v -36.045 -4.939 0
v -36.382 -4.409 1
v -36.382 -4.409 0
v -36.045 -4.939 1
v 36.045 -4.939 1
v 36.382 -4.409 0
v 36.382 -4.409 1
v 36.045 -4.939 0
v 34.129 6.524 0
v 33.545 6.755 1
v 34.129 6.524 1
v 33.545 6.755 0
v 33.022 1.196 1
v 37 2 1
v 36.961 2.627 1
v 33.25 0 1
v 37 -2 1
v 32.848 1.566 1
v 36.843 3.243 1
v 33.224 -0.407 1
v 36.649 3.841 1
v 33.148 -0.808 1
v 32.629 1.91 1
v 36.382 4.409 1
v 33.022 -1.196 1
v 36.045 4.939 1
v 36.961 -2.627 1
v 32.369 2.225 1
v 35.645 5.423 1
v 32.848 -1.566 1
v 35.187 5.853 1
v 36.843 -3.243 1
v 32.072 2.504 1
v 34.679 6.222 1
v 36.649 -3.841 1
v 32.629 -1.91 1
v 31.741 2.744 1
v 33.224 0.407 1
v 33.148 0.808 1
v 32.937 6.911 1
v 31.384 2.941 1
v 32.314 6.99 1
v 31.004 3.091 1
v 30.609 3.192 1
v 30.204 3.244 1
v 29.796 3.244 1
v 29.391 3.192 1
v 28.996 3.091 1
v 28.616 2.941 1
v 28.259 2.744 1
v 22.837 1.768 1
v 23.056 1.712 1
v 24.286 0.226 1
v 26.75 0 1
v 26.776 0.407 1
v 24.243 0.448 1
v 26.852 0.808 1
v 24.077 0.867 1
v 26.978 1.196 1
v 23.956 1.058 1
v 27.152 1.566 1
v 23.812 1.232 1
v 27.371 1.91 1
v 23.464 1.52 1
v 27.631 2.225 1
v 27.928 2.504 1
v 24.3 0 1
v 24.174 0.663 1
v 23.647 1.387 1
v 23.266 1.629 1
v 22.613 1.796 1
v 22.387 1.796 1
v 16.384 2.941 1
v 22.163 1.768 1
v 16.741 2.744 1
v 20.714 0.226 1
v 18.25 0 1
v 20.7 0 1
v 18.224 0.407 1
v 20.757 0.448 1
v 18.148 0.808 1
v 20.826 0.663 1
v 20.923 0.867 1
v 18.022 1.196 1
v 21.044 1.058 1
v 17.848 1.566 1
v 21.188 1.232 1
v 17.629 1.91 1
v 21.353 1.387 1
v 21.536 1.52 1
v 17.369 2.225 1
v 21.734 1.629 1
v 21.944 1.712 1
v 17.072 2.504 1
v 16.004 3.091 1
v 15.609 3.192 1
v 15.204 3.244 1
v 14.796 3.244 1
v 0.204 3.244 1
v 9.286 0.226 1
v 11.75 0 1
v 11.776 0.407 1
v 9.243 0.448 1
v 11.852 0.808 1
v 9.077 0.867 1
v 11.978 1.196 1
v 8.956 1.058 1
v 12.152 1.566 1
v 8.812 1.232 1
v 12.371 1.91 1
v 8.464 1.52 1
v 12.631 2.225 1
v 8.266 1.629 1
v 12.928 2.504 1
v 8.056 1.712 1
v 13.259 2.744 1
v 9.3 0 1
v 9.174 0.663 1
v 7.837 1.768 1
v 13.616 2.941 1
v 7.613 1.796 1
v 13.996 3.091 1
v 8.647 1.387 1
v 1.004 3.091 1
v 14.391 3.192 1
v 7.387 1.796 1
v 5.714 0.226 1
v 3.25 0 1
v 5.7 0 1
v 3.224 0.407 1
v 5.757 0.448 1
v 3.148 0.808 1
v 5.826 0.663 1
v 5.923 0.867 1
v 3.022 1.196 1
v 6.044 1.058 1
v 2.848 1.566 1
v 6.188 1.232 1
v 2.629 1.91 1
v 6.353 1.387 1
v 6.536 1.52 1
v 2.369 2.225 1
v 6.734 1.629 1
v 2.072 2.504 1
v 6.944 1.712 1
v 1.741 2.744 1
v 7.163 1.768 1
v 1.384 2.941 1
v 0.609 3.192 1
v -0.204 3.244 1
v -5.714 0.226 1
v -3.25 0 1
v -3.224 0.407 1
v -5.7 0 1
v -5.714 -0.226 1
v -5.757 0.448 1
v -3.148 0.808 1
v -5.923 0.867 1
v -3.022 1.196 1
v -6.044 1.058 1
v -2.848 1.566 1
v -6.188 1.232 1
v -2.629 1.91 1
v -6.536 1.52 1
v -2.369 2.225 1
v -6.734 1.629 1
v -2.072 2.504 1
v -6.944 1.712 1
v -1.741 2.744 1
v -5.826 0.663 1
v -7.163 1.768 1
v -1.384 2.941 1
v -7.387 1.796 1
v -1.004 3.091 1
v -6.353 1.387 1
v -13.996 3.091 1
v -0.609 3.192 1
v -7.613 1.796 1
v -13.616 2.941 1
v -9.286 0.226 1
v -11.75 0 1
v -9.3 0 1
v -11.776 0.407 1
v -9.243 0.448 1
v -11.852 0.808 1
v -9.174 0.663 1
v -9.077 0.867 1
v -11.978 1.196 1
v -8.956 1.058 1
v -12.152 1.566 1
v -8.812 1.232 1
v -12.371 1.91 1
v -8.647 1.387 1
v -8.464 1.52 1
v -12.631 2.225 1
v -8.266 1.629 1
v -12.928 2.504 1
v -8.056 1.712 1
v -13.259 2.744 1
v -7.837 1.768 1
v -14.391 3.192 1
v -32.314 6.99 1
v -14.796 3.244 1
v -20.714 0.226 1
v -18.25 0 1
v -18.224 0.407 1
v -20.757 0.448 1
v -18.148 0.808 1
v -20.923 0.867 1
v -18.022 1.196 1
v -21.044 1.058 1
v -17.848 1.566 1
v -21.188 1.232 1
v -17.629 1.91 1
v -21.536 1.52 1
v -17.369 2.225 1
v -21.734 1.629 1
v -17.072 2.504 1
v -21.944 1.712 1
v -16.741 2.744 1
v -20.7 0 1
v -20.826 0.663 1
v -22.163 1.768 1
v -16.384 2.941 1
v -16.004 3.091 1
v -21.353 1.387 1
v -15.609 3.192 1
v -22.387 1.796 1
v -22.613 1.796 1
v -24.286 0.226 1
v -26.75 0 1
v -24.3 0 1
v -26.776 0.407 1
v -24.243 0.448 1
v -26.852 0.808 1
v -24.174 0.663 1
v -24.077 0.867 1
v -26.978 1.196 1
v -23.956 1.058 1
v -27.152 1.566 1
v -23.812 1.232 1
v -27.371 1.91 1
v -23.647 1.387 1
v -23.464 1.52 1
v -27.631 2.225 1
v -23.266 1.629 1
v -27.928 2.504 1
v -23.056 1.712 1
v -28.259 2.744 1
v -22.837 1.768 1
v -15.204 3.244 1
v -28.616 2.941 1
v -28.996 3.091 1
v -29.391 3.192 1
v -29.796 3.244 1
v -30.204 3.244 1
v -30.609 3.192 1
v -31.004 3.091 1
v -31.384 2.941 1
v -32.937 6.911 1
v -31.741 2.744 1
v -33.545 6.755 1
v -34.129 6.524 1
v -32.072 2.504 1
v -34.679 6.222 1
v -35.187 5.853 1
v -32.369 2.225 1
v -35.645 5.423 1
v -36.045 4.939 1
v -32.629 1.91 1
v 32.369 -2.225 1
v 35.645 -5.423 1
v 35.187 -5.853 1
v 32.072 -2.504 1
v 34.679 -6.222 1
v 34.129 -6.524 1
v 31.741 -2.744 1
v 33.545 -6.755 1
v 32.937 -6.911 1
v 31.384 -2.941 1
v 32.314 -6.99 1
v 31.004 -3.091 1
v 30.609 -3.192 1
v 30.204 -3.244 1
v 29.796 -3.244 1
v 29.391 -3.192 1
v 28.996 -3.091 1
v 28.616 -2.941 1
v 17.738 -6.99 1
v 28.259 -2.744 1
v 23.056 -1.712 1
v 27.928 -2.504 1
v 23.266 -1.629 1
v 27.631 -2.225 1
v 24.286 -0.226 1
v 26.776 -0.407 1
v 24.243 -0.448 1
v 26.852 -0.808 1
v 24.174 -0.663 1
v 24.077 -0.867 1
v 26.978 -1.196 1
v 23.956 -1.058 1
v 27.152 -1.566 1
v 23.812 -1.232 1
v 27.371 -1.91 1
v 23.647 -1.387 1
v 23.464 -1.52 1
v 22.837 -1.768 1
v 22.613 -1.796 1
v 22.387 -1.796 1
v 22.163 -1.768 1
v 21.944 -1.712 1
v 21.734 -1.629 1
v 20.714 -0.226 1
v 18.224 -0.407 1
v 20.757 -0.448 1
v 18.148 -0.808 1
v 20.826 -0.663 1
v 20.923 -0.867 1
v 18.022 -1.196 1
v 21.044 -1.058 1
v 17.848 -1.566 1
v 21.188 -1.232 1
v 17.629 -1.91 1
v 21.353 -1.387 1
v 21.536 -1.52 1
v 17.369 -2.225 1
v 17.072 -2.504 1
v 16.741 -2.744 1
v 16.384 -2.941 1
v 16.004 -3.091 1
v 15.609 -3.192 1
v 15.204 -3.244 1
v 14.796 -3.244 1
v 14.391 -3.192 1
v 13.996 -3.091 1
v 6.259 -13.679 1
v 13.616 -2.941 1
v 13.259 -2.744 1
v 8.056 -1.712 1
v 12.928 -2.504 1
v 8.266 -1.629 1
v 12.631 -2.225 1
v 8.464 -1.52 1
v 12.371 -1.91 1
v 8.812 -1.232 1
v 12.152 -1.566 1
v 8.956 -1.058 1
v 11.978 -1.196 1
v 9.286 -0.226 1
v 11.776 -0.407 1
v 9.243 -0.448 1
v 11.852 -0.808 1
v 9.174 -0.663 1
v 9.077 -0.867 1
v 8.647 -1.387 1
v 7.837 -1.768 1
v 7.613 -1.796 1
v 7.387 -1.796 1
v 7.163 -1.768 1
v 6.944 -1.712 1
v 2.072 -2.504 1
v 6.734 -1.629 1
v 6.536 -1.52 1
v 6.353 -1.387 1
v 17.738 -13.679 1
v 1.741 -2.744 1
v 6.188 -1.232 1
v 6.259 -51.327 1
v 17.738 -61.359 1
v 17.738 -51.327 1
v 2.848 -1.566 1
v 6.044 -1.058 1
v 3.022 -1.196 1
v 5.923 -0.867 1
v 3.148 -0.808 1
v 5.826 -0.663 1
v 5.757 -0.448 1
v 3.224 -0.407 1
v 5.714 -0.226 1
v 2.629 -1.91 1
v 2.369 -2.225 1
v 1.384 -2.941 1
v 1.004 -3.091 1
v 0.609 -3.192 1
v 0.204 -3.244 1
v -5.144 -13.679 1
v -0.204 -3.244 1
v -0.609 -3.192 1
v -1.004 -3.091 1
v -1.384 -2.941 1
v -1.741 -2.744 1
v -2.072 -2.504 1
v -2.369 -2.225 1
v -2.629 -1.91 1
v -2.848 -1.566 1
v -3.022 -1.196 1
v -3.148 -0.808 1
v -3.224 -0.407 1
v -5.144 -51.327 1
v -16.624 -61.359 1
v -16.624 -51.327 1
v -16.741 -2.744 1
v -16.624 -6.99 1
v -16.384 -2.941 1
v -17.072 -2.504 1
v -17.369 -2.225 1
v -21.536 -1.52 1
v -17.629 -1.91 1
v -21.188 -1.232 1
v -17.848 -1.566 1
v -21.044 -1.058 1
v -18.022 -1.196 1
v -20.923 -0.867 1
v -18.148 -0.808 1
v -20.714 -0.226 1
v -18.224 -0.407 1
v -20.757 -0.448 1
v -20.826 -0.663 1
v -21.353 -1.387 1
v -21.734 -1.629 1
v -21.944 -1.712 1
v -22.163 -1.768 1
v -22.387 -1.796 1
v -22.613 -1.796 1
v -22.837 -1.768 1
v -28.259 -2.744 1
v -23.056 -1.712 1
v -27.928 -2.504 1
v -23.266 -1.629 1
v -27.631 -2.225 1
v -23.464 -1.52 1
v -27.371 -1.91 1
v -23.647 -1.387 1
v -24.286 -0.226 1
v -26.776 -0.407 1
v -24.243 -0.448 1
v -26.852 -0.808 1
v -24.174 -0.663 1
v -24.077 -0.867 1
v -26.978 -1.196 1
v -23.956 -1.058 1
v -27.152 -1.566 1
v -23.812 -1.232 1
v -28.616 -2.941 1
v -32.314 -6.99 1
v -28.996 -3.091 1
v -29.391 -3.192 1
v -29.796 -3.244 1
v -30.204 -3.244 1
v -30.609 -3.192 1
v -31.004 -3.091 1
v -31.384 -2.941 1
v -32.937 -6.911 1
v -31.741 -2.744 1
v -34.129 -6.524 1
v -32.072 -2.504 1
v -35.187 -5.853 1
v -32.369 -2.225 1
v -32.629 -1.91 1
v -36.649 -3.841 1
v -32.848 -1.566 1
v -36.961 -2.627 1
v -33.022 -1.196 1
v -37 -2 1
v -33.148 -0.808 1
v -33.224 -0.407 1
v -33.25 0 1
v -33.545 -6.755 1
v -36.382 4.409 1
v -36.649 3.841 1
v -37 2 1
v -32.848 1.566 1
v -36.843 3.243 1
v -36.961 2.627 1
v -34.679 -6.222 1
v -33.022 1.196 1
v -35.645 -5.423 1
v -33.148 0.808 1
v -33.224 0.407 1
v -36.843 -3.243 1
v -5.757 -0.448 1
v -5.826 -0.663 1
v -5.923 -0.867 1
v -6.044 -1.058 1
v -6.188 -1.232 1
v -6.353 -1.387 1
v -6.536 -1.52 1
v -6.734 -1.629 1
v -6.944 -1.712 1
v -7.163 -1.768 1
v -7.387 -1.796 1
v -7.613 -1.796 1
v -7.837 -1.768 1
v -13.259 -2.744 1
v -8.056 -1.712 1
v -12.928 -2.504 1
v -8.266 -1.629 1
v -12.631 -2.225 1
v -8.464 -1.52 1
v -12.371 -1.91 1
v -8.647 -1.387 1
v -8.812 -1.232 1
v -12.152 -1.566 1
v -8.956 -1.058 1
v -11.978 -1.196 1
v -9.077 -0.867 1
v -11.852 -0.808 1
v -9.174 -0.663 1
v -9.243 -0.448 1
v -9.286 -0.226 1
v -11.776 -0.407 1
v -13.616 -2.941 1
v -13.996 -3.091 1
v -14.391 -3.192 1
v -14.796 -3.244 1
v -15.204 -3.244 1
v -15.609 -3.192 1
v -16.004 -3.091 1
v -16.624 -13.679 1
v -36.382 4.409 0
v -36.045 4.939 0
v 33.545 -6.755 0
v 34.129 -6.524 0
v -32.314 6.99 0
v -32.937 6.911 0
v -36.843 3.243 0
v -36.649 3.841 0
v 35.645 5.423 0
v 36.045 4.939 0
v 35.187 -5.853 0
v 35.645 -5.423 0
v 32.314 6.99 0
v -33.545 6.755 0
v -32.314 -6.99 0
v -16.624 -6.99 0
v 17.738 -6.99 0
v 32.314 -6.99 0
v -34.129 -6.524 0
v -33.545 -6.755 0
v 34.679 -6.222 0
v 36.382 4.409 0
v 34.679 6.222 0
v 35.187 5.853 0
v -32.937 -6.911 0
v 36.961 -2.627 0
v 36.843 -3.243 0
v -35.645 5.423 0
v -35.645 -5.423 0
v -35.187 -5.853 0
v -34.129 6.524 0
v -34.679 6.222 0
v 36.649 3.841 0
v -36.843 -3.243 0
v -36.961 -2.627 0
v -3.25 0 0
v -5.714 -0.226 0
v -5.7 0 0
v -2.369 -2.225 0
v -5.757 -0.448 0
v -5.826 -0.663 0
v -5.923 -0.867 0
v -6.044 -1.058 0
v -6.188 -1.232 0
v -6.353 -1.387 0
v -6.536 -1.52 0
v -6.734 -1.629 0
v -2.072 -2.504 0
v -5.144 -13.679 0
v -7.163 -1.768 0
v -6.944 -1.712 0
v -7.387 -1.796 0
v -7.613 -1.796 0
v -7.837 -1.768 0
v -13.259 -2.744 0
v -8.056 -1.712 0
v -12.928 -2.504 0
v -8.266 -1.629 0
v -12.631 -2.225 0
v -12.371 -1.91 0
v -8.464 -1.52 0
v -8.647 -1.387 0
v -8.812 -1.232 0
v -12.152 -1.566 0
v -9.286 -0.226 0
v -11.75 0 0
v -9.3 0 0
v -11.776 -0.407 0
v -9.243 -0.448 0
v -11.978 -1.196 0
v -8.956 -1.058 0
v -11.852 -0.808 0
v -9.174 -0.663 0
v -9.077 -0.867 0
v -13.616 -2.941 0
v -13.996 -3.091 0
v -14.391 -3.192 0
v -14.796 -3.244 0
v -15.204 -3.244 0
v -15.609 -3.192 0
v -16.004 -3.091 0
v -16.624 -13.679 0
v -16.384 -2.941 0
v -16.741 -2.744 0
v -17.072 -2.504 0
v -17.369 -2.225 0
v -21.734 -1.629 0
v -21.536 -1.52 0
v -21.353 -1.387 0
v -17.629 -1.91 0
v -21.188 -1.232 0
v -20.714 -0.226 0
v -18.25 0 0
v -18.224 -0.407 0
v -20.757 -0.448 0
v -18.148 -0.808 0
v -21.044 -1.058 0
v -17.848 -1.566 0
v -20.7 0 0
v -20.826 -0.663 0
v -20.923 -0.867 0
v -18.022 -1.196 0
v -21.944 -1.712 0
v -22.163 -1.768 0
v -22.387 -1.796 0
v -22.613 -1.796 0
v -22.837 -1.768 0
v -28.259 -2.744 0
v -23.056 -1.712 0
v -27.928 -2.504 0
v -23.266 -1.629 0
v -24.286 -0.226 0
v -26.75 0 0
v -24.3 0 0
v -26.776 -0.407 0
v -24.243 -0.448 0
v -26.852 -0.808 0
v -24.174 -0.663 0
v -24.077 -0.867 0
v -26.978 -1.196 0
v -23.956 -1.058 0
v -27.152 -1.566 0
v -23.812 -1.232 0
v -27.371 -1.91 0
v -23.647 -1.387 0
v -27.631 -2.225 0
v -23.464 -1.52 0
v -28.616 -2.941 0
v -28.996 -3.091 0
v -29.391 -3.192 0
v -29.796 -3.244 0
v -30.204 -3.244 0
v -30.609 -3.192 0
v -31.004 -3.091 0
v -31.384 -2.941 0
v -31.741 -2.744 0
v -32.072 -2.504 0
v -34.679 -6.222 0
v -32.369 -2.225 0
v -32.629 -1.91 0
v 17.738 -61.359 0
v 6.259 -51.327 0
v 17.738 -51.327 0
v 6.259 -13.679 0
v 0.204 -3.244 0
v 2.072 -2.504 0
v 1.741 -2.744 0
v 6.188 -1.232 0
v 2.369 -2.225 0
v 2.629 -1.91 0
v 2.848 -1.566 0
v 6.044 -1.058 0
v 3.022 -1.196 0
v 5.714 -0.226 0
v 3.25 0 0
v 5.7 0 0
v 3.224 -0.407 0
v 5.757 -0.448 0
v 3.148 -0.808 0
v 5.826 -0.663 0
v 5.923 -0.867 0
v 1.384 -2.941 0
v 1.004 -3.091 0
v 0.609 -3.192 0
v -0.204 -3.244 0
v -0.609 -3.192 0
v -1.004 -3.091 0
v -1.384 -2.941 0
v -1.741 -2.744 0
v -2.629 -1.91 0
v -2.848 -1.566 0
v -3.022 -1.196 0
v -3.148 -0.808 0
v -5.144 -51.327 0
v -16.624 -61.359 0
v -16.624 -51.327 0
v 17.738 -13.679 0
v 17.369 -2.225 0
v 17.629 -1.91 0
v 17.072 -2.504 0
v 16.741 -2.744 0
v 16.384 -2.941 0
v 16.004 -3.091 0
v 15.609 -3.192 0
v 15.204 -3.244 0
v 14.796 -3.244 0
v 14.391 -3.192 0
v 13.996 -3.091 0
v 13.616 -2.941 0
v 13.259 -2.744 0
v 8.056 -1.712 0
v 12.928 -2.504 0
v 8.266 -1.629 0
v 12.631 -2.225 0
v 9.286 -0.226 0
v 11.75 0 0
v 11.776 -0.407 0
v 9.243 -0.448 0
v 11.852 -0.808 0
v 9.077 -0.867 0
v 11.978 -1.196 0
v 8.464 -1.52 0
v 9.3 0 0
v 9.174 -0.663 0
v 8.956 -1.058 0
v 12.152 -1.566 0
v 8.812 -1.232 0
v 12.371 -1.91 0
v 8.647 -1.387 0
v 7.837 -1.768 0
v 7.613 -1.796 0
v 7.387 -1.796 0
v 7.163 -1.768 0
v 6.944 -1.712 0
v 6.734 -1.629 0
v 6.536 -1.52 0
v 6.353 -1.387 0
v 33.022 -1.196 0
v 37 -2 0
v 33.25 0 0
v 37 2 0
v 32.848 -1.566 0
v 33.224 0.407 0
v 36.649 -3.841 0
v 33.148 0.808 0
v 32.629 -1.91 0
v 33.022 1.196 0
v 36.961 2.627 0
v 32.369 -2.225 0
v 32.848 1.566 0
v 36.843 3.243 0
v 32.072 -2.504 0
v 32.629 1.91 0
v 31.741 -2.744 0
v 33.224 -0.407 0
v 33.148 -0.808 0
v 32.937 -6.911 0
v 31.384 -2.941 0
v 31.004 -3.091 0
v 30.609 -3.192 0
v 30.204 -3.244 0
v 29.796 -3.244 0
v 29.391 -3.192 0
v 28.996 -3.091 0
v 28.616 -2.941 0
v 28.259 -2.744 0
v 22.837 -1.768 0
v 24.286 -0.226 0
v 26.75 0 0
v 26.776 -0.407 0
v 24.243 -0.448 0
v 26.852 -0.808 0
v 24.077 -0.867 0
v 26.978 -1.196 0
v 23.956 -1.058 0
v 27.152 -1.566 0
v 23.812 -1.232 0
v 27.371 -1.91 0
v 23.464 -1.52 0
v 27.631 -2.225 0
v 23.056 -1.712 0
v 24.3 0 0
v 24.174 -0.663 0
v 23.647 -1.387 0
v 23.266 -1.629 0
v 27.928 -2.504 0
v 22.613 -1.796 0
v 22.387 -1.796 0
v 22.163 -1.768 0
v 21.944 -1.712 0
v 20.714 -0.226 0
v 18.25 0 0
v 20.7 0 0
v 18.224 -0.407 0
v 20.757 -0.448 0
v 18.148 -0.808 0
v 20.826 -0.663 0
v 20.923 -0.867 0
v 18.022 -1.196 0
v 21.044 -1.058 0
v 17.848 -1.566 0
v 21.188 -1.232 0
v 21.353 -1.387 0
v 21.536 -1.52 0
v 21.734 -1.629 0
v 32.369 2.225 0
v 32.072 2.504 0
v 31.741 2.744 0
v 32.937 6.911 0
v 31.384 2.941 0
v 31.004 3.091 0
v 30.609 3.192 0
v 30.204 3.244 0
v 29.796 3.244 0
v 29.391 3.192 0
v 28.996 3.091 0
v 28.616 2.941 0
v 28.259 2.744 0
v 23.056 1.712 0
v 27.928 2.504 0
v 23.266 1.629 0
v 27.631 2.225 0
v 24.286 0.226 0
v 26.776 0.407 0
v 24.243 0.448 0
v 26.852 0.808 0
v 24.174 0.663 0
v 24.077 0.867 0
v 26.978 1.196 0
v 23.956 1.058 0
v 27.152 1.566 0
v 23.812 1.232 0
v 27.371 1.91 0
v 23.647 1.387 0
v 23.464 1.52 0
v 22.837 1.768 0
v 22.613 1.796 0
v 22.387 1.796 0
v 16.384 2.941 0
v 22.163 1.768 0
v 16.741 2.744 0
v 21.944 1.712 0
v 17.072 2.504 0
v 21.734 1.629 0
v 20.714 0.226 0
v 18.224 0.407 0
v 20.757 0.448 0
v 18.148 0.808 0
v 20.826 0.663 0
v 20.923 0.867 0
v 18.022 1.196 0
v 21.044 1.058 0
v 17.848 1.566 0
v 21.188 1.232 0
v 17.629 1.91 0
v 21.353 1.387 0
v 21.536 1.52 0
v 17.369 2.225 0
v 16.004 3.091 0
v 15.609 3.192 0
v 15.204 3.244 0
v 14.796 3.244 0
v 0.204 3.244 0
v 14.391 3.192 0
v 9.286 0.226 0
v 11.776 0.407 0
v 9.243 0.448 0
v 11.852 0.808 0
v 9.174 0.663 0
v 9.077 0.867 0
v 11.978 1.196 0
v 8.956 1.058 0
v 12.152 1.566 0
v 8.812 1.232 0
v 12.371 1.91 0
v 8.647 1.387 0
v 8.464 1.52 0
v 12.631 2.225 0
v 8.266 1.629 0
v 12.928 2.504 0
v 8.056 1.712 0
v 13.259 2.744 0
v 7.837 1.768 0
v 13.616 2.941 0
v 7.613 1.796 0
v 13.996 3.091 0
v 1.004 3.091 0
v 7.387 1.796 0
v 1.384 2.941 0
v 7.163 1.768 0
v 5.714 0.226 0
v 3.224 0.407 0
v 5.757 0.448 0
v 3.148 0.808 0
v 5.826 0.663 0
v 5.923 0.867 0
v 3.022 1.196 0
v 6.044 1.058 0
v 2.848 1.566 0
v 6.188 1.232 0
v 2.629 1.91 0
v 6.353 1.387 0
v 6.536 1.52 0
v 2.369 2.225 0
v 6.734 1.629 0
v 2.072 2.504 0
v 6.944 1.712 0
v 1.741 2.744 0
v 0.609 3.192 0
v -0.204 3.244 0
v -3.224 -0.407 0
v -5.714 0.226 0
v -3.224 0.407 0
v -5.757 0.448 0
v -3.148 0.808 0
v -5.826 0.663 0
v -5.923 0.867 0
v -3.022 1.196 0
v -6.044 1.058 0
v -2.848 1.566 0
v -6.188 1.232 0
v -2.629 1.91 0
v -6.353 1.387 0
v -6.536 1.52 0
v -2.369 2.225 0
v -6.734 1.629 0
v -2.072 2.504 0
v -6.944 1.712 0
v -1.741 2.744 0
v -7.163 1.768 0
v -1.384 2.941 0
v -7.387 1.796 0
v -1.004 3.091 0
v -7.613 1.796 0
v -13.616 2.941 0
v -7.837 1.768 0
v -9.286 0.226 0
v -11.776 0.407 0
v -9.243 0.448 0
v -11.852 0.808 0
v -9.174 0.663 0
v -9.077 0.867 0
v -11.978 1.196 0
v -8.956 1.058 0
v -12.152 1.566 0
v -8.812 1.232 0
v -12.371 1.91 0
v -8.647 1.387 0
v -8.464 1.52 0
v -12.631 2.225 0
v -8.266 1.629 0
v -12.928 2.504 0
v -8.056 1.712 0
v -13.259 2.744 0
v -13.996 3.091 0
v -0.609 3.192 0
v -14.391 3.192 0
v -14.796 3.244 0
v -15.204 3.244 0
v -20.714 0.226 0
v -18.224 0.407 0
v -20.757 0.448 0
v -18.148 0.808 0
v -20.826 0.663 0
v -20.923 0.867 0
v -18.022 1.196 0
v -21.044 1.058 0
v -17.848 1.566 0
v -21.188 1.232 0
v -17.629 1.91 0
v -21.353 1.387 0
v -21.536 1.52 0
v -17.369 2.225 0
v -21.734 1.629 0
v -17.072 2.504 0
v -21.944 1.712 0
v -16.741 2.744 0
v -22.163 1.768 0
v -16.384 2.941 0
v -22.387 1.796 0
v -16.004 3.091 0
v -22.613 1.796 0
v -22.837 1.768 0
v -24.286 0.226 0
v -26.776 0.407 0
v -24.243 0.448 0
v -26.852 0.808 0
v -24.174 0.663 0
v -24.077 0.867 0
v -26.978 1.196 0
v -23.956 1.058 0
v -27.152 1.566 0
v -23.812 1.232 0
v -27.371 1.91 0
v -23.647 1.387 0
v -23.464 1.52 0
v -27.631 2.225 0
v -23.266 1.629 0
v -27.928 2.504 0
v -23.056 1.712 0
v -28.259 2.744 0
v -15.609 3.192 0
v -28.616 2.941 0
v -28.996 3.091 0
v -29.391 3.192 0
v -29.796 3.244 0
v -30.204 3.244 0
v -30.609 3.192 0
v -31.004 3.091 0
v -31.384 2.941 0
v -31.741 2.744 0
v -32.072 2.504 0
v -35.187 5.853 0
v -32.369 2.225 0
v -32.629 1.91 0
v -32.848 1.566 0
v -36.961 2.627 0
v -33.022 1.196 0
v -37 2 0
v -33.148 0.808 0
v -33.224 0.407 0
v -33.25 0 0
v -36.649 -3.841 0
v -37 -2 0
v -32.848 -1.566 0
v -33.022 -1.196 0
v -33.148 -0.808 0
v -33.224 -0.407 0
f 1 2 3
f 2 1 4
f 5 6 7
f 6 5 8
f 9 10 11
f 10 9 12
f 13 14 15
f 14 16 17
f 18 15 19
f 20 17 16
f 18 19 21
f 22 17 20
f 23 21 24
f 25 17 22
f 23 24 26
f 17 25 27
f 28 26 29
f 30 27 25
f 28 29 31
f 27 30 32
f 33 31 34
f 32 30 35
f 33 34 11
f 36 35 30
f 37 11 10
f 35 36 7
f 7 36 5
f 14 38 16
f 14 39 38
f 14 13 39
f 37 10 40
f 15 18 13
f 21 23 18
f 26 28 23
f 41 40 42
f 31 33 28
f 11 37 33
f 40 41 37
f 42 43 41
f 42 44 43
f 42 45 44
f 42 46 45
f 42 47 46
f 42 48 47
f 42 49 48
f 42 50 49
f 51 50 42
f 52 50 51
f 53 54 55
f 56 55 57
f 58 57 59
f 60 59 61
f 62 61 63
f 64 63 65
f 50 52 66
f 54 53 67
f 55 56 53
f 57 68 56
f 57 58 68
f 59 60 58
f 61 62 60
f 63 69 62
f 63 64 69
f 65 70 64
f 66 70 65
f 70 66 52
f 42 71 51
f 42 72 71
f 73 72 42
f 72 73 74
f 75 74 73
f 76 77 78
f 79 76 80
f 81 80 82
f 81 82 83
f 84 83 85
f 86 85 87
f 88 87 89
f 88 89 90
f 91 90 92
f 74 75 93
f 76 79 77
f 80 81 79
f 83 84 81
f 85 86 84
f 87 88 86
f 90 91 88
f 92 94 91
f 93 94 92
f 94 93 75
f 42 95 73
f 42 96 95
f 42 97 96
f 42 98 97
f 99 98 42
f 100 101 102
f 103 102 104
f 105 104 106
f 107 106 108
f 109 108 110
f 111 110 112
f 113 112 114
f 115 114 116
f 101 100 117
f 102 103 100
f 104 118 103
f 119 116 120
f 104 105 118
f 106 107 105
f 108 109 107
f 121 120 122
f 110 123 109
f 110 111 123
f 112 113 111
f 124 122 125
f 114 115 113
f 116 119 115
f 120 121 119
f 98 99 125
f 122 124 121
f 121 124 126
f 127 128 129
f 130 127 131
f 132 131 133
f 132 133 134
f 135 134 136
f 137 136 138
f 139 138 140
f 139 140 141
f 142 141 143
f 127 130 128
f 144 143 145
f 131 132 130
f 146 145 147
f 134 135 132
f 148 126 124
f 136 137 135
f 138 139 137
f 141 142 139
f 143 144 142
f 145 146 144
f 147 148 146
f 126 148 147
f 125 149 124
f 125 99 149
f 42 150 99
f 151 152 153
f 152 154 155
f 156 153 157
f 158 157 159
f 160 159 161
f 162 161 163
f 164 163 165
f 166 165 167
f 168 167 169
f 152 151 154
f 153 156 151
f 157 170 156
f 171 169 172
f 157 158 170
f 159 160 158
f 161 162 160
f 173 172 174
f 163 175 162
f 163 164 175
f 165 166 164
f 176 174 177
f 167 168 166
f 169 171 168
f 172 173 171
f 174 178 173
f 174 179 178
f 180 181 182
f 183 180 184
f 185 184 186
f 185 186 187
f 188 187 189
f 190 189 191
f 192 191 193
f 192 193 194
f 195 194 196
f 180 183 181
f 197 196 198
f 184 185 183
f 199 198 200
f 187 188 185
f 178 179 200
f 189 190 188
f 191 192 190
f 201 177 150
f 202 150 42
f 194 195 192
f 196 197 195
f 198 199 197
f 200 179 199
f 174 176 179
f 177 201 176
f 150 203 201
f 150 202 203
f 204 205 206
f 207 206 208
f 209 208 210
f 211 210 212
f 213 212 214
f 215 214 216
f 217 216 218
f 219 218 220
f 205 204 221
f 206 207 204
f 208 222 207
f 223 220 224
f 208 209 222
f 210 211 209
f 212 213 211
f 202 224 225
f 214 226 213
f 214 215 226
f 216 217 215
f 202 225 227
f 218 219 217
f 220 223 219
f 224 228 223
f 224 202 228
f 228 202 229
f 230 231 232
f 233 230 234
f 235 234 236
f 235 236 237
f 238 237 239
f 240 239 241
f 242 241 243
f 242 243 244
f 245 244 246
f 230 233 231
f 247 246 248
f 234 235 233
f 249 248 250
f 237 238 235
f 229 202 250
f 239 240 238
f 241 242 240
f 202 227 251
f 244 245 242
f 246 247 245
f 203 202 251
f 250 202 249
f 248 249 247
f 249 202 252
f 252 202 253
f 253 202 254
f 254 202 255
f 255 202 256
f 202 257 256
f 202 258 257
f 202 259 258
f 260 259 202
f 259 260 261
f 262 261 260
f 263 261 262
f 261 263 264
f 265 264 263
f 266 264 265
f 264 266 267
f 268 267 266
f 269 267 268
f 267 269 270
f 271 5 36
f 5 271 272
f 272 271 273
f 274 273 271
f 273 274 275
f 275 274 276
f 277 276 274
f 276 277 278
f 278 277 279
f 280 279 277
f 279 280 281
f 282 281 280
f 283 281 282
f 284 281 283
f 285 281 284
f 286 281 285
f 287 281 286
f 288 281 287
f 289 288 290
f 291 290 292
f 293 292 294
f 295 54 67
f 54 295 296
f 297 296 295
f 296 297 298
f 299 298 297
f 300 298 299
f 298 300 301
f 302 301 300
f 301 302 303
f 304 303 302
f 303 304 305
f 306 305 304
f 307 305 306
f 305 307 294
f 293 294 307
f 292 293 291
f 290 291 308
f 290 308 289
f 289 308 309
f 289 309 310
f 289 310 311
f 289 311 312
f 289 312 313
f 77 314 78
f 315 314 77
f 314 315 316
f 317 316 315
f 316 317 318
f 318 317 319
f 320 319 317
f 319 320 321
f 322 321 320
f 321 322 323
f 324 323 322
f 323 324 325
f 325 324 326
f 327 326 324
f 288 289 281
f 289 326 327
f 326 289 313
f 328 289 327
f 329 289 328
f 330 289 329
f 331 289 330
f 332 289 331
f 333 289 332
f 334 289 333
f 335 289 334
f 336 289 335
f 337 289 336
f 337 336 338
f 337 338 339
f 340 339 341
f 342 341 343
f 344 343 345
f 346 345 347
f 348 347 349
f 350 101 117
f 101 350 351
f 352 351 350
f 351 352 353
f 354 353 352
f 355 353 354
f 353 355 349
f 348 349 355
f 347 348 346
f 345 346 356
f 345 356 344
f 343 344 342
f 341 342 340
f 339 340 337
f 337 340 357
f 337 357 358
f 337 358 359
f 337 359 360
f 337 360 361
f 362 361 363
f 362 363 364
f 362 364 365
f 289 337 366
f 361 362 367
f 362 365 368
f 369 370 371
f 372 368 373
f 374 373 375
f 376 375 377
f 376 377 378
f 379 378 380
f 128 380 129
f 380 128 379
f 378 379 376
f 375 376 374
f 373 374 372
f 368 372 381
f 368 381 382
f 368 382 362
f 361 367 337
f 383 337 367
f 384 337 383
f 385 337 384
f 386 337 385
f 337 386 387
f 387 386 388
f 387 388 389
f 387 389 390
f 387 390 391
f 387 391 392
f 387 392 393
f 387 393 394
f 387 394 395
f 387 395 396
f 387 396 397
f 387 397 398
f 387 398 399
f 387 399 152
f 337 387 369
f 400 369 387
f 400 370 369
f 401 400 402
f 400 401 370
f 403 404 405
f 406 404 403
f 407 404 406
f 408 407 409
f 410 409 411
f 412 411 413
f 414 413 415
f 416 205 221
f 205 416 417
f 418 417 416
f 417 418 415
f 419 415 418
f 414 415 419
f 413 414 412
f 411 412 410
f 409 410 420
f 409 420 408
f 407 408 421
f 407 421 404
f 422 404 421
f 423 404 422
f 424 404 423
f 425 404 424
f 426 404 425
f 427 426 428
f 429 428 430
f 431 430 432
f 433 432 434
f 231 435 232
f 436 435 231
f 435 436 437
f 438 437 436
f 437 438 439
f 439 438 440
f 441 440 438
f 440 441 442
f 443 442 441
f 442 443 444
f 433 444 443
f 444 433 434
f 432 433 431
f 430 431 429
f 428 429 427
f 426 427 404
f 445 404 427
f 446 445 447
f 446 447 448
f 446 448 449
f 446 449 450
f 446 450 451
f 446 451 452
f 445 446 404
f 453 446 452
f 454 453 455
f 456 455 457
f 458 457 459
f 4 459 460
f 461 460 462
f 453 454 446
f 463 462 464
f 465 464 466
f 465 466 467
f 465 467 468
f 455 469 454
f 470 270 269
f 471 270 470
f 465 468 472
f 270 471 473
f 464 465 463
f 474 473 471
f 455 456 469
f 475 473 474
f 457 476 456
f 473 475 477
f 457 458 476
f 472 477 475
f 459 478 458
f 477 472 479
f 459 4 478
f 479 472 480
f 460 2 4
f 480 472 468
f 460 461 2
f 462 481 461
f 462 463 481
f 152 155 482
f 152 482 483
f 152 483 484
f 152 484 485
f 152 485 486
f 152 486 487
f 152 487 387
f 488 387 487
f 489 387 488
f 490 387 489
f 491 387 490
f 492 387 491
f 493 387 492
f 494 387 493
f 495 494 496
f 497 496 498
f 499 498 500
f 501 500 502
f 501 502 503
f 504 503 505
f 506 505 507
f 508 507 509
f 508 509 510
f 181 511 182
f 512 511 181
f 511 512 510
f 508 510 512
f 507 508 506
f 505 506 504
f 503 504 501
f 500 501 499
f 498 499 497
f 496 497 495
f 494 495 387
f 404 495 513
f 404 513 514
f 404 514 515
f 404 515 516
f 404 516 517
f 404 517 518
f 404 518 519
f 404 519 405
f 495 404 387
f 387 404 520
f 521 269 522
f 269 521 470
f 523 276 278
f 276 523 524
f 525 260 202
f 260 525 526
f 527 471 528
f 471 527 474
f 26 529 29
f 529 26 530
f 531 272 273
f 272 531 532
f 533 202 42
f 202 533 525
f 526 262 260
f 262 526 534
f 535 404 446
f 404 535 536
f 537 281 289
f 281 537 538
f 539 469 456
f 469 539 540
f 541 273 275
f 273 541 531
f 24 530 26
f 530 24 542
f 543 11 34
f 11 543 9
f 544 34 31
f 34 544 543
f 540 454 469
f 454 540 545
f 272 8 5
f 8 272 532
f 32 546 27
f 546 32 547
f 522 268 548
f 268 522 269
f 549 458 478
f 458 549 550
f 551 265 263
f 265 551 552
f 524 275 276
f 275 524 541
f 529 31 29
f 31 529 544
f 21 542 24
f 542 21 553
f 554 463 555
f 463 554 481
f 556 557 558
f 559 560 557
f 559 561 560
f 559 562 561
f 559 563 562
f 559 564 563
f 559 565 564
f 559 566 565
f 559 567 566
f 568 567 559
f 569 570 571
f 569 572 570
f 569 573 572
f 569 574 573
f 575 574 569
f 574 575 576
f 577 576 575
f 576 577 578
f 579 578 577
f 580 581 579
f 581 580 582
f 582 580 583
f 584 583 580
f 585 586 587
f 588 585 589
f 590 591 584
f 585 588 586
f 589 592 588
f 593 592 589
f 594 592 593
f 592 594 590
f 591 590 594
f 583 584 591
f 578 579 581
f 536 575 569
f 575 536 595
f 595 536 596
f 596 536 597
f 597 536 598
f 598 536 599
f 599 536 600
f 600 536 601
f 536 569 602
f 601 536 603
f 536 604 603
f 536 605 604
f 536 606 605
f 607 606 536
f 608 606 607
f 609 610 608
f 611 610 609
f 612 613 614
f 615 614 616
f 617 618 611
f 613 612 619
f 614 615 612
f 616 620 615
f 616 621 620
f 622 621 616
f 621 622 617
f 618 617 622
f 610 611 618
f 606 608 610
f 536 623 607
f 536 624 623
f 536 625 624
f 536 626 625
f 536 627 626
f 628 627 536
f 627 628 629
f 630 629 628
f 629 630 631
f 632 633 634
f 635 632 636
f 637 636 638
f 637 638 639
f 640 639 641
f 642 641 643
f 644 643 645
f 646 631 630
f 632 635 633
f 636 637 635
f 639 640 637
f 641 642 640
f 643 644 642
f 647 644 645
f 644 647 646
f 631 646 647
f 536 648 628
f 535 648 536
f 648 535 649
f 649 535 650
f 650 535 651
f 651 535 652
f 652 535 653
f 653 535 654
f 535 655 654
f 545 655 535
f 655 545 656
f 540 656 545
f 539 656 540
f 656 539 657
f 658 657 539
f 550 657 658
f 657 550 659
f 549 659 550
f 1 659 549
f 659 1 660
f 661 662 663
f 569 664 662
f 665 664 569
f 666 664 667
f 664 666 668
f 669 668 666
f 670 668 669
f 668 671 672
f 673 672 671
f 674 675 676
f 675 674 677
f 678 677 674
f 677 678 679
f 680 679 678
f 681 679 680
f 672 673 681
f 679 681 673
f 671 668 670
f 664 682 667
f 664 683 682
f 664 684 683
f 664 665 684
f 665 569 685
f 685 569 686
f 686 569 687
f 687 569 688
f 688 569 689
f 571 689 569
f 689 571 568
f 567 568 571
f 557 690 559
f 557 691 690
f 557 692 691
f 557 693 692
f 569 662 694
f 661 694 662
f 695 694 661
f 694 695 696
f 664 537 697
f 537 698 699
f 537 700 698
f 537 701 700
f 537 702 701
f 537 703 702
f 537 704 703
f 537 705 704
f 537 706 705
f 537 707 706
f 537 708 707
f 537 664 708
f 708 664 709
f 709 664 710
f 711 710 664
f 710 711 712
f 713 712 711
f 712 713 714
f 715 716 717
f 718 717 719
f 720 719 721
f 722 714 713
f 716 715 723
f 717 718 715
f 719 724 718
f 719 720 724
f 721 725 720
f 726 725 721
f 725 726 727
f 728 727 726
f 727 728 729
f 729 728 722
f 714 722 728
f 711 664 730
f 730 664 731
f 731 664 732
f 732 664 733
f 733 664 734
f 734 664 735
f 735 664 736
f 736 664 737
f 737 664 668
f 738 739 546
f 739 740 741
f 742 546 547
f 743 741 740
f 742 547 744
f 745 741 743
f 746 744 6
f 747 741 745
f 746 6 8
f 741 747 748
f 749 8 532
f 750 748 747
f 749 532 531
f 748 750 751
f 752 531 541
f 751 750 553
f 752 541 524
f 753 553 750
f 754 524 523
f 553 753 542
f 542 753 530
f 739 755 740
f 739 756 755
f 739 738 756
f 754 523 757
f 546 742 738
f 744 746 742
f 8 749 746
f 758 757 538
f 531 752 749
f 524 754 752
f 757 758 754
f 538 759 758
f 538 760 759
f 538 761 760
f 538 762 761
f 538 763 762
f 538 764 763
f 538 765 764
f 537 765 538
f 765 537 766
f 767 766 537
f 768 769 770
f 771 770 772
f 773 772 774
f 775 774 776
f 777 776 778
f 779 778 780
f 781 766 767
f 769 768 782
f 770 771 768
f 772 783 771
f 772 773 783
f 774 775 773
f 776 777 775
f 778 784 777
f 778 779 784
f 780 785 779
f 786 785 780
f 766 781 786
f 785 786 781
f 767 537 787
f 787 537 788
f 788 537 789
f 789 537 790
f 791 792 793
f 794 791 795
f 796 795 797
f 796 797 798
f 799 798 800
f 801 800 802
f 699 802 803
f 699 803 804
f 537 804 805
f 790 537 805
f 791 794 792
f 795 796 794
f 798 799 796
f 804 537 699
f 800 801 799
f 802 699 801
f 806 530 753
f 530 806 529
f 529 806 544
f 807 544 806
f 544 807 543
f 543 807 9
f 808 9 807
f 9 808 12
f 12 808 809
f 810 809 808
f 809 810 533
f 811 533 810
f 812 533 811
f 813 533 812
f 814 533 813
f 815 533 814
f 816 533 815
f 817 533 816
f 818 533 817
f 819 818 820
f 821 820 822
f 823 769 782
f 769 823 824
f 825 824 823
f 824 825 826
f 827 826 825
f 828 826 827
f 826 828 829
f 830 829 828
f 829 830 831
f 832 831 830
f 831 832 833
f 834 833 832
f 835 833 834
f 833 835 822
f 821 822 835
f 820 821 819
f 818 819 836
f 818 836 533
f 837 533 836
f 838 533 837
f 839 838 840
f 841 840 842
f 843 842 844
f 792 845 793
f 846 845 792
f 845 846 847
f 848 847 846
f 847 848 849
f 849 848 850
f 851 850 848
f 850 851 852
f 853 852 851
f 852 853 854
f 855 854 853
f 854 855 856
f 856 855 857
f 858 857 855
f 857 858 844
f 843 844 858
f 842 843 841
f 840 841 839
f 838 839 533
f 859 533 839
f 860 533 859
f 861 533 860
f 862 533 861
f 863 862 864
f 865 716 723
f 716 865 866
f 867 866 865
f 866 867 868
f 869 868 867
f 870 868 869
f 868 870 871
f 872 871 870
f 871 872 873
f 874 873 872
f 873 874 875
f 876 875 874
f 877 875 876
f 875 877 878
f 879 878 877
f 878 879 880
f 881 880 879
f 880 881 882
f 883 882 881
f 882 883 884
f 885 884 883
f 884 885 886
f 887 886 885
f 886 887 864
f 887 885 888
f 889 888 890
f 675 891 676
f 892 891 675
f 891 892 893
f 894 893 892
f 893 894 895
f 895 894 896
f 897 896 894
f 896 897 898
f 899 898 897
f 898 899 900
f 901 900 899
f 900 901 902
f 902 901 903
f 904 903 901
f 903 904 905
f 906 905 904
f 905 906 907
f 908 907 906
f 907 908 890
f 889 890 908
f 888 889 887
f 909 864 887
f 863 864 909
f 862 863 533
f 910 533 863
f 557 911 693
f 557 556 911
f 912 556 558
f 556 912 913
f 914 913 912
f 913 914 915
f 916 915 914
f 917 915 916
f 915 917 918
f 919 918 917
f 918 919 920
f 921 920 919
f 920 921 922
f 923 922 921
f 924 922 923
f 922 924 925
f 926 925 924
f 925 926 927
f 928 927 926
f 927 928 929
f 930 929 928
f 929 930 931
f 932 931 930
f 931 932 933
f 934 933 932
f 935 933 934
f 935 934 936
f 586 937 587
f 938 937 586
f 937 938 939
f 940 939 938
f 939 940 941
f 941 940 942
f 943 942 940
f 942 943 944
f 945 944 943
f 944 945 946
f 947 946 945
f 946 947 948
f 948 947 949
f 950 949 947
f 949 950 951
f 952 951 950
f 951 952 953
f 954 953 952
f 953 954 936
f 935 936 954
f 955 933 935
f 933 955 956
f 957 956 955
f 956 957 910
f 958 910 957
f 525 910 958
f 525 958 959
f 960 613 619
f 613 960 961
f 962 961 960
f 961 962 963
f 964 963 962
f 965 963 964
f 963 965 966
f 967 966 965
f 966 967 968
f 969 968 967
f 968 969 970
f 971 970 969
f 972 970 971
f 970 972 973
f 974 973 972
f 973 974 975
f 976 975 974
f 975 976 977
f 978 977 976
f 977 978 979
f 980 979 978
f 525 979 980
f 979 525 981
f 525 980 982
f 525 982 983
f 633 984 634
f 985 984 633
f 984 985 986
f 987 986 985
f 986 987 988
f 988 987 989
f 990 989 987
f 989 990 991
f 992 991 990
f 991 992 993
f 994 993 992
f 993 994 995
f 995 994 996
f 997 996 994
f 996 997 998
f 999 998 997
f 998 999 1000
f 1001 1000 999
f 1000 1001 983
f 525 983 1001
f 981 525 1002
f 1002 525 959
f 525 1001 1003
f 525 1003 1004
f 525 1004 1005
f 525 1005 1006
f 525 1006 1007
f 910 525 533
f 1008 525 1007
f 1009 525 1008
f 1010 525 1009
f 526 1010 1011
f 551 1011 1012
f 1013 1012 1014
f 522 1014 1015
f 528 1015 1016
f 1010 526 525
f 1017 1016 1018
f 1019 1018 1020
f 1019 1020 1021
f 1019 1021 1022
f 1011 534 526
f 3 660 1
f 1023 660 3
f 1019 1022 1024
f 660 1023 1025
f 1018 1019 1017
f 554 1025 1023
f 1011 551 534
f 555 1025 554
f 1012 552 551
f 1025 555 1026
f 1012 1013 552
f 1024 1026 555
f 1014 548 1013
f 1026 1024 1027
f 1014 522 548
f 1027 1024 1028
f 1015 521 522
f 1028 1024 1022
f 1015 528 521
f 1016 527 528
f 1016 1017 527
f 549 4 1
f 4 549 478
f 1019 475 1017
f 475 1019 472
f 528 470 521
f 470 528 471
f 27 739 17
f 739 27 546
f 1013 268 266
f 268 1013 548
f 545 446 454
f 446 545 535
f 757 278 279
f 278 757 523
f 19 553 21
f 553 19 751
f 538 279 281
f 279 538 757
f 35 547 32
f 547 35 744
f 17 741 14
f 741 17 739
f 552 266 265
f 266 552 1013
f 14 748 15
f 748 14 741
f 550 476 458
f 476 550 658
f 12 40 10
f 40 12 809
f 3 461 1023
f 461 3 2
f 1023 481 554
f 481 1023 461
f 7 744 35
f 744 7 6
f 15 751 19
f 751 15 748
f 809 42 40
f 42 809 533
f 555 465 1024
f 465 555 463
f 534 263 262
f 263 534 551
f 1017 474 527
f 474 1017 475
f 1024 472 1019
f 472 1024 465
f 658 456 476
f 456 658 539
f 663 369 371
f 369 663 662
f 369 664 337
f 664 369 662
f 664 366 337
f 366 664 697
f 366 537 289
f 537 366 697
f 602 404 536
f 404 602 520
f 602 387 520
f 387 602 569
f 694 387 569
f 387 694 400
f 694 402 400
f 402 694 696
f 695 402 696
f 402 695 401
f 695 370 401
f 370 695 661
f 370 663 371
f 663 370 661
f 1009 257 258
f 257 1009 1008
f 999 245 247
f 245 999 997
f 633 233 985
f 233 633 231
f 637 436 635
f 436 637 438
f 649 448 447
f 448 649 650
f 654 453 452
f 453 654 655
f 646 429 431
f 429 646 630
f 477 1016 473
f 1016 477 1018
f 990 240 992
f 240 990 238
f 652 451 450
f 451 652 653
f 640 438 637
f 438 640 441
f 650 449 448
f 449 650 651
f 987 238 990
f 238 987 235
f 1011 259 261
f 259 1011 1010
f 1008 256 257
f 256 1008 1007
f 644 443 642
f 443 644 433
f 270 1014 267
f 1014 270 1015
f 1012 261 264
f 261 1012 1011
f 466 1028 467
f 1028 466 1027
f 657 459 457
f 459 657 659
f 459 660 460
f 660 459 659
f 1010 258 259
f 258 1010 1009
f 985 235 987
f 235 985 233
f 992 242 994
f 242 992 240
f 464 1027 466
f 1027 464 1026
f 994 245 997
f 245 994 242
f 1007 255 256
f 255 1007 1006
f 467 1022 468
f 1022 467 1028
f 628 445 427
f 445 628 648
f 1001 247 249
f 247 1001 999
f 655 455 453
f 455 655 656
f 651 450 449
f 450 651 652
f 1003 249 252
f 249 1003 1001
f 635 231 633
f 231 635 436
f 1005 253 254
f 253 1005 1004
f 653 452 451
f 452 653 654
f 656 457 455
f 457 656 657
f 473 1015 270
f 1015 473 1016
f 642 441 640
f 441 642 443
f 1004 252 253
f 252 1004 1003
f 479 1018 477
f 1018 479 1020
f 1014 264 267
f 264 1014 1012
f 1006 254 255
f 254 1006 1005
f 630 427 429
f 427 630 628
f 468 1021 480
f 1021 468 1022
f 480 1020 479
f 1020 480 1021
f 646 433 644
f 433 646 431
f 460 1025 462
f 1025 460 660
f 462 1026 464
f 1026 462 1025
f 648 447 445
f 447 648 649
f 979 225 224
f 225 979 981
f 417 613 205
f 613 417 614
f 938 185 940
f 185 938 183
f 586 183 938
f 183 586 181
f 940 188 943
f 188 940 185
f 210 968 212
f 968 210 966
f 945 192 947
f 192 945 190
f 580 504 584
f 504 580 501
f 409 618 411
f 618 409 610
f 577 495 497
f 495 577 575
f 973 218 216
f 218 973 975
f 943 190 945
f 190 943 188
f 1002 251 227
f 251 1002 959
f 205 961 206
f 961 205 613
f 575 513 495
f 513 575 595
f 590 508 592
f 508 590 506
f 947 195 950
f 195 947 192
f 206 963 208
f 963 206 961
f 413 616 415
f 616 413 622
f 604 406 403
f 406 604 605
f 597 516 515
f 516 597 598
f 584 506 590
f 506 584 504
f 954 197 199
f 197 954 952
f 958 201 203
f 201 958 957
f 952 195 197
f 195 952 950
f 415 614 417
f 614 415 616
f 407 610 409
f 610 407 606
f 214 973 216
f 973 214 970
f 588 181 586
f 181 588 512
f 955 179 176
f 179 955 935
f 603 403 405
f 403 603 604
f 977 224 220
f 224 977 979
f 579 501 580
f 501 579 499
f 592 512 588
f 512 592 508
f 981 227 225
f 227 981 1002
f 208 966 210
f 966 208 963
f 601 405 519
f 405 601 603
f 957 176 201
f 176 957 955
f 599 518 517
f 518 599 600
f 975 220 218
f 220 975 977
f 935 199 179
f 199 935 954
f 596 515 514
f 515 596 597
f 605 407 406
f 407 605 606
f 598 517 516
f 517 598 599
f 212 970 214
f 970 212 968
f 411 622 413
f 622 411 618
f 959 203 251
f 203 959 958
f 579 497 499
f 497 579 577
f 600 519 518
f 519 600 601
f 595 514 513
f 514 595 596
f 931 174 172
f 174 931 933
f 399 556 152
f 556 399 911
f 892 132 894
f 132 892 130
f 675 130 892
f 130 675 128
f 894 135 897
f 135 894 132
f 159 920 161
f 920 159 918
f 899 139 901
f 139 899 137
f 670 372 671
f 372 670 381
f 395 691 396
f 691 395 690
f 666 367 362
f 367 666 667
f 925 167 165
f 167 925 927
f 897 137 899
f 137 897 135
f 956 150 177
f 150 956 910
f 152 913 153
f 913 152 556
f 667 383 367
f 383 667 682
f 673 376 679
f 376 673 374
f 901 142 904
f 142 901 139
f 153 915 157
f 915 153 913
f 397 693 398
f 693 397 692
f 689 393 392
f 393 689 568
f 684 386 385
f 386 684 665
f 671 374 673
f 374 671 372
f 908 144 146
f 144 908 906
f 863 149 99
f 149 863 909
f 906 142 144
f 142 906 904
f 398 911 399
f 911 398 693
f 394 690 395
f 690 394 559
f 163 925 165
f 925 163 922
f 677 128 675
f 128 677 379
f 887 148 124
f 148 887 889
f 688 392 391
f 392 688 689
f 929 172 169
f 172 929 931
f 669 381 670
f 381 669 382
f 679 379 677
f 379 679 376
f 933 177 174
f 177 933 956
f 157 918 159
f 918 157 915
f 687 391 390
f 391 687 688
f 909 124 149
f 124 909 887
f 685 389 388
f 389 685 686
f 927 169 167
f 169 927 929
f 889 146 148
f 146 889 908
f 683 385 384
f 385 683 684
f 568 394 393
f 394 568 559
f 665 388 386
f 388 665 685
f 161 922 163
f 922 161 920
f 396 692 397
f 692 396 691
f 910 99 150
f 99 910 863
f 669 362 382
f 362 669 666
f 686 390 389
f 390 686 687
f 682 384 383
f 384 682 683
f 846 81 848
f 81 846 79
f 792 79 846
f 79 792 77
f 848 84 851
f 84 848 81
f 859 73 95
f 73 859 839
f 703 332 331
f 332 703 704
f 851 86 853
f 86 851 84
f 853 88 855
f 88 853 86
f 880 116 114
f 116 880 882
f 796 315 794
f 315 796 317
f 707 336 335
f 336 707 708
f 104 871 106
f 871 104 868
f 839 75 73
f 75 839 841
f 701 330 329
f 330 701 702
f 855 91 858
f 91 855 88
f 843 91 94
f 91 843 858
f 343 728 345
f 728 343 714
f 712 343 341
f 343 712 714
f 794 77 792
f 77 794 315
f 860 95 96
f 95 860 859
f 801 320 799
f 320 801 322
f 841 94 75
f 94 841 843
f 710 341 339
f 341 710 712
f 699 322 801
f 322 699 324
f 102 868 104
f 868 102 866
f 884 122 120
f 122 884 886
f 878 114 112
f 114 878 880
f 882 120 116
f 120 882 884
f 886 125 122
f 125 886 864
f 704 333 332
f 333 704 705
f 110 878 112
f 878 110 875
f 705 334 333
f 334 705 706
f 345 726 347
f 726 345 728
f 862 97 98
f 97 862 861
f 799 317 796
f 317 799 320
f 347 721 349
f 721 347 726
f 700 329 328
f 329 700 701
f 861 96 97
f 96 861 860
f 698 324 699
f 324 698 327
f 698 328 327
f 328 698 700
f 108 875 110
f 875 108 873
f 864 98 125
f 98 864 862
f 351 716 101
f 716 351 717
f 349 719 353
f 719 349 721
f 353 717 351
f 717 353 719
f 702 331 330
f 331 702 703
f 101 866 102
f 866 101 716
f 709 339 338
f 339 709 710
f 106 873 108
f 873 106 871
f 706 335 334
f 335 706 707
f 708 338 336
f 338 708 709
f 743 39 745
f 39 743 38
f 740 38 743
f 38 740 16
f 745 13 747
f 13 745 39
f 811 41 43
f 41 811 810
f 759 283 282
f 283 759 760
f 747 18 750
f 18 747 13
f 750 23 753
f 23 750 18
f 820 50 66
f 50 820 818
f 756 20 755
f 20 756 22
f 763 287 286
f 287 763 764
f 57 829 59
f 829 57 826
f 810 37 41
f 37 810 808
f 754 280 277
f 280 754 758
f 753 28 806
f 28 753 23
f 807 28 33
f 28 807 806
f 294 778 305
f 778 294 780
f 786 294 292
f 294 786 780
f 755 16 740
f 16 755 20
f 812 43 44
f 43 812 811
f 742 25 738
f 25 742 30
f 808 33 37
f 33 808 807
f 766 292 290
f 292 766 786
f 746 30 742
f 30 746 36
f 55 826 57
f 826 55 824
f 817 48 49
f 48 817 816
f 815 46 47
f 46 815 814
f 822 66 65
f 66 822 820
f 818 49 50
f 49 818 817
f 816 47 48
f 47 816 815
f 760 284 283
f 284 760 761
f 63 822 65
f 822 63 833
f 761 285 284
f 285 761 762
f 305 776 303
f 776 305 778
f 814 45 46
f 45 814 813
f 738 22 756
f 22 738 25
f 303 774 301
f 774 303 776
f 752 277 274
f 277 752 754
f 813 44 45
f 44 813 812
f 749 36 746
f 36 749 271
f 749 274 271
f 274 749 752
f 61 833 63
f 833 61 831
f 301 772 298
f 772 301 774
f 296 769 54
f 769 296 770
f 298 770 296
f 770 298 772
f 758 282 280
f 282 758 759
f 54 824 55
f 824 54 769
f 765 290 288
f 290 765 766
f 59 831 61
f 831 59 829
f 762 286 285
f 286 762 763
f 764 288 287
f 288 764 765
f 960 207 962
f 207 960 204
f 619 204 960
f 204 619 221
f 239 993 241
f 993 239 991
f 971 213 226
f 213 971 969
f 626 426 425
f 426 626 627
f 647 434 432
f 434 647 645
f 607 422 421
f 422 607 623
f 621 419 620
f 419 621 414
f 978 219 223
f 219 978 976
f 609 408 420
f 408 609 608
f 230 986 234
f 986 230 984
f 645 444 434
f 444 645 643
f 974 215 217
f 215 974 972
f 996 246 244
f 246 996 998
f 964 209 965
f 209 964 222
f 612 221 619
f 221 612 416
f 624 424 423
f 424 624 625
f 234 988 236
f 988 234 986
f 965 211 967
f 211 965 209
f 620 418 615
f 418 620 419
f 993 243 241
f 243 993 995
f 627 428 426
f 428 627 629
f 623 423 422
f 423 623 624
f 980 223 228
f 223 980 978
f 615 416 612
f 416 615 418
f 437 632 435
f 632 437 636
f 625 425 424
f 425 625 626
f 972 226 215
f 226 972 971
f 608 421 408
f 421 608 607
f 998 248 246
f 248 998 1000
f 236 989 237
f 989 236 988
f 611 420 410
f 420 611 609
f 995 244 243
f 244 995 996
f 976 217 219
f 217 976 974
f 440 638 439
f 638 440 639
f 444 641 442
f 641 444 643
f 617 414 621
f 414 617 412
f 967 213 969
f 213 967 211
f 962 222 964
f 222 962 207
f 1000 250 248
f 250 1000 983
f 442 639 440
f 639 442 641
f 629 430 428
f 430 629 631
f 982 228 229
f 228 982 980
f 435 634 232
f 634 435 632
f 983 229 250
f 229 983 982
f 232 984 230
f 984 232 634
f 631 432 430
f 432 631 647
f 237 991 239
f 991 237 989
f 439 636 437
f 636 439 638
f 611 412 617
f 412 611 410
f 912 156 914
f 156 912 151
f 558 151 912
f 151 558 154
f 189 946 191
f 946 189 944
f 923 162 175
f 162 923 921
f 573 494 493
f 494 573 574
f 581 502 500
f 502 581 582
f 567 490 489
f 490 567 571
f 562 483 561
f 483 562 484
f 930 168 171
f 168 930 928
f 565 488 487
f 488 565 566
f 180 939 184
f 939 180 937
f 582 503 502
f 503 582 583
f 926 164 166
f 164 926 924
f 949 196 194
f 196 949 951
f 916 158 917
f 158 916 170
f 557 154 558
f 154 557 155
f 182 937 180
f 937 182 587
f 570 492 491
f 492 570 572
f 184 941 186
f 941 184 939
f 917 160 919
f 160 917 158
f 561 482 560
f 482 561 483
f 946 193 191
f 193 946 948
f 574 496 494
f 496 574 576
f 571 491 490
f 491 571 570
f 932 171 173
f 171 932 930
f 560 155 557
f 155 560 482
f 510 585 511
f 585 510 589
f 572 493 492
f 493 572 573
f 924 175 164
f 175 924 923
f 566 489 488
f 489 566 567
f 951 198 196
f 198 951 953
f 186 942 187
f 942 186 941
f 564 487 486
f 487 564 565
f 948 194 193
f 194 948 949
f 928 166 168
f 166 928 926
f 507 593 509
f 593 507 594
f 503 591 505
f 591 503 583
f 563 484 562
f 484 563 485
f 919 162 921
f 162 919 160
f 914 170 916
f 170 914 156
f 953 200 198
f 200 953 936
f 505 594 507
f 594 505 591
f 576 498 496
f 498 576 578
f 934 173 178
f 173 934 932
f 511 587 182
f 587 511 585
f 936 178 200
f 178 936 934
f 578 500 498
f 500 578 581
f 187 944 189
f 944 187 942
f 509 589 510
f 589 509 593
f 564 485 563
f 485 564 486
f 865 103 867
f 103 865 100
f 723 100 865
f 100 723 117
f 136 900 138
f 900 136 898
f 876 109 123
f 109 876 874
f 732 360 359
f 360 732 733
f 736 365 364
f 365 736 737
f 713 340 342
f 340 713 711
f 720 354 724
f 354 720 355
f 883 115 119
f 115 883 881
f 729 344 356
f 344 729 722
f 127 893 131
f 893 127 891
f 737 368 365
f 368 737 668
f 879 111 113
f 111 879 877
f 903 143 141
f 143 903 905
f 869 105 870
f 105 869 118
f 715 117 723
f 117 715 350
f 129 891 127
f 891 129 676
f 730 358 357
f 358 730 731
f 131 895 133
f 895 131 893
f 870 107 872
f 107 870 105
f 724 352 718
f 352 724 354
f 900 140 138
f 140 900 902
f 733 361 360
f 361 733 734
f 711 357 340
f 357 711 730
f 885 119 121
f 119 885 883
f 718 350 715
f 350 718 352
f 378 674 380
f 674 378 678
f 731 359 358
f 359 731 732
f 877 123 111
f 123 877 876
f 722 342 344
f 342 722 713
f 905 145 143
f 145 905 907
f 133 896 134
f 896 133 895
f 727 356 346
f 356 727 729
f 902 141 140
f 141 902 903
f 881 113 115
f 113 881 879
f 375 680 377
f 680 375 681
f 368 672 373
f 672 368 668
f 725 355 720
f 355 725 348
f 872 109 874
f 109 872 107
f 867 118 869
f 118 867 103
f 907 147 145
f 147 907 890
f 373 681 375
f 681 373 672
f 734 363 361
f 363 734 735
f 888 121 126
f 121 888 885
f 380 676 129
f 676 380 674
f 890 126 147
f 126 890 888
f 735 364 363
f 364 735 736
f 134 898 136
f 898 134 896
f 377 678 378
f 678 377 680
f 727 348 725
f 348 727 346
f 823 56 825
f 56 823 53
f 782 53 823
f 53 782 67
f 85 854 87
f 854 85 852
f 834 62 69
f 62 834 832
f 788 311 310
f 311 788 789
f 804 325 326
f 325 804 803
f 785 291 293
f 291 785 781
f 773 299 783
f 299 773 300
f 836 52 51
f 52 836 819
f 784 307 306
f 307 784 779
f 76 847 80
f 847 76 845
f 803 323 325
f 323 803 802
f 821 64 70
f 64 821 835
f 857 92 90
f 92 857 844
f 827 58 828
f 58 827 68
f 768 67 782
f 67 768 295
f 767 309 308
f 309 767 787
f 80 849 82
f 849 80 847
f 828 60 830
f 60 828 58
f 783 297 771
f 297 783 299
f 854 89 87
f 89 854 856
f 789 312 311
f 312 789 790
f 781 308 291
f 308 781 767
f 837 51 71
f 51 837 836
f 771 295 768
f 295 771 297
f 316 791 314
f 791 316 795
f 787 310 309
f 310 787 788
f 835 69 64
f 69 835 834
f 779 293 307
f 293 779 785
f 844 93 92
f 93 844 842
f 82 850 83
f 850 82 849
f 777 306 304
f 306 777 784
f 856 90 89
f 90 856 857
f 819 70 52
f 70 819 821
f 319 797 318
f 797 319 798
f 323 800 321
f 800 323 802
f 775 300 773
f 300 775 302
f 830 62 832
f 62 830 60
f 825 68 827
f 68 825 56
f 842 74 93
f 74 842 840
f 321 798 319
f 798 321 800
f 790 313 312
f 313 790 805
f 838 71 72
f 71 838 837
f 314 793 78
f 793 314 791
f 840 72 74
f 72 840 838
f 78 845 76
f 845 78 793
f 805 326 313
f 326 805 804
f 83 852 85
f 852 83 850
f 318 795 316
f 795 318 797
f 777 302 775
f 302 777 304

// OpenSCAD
$fn = 50;


difference() {
	union() {
		*color(alpha = 1.0000000000, c = "gray") {
			translate(v = [0, 14, 0]) {
				linear_extrude(height = 1) {
					text(font = "Arial:style=Bold", halign = "center", size = 4.5000000000, text = "COMMENT description oobb_plate_shape_p_type_1_depth_5_width_1_thickness_i_extra_oobb_size", valign = "center");
				}
			}
		}
		hull() {
			translate(v = [-32.0000000000, 2.0000000000, 0]) {
				cylinder(h = 1, r = 5);
			}
			translate(v = [32.0000000000, 2.0000000000, 0]) {
				cylinder(h = 1, r = 5);
			}
			translate(v = [-32.0000000000, -2.0000000000, 0]) {
				cylinder(h = 1, r = 5);
			}
			translate(v = [32.0000000000, -2.0000000000, 0]) {
				cylinder(h = 1, r = 5);
			}
		}
		translate(v = [0, -5, 0]) {
			linear_extrude(height = 1) {
				text(font = "DejaVu Sans Mono:style=Bold", halign = "center", size = 57.0000000000, text = "I", valign = "top");
			}
		}
	}
	union() {
		*color(alpha = 1.0000000000, c = "gray") {
			translate(v = [0, 14, 0]) {
				linear_extrude(height = 1) {
					text(font = "Arial:style=Bold", halign = "center", size = 4.5000000000, text = "COMMENT description oobb_holes_shape_n_type_5_width_1_thickness_i_extra_oobb_size_1_height_'all'_holes_true_both_holes", valign = "center");
				}
			}
		}
		translate(v = [-30.0000000000, 0.0000000000, 0]) {
			translate(v = [0, 0, -50]) {
				cylinder(h = 100, r = 3.2500000000);
			}
		}
		translate(v = [-15.0000000000, 0.0000000000, 0]) {
			translate(v = [0, 0, -50]) {
				cylinder(h = 100, r = 3.2500000000);
			}
		}
		translate(v = [0, 0, -50]) {
			cylinder(h = 100, r = 3.2500000000);
		}
		translate(v = [15.0000000000, 0.0000000000, 0]) {
			translate(v = [0, 0, -50]) {
				cylinder(h = 100, r = 3.2500000000);
			}
		}
		translate(v = [30.0000000000, 0.0000000000, 0]) {
			translate(v = [0, 0, -50]) {
				cylinder(h = 100, r = 3.2500000000);
			}
		}
		translate(v = [-30.0000000000, 0.0000000000, 0]) {
			translate(v = [0, 0, -50]) {
				cylinder(h = 100, r = 1.8000000000);
			}
		}
		translate(v = [-22.5000000000, 0.0000000000, 0]) {
			translate(v = [0, 0, -50]) {
				cylinder(h = 100, r = 1.8000000000);
			}
		}
		translate(v = [-15.0000000000, 0.0000000000, 0]) {
			translate(v = [0, 0, -50]) {
				cylinder(h = 100, r = 1.8000000000);
			}
		}
		translate(v = [-7.5000000000, 0.0000000000, 0]) {
			translate(v = [0, 0, -50]) {
				cylinder(h = 100, r = 1.8000000000);
			}
		}
		translate(v = [0, 0, -50]) {
			cylinder(h = 100, r = 1.8000000000);
		}
		translate(v = [7.5000000000, 0.0000000000, 0]) {
			translate(v = [0, 0, -50]) {
				cylinder(h = 100, r = 1.8000000000);
			}
		}
		translate(v = [15.0000000000, 0.0000000000, 0]) {
			translate(v = [0, 0, -50]) {
				cylinder(h = 100, r = 1.8000000000);
			}
		}
		translate(v = [22.5000000000, 0.0000000000, 0]) {
			translate(v = [0, 0, -50]) {
				cylinder(h = 100, r = 1.8000000000);
			}
		}
		translate(v = [30.0000000000, 0.0000000000, 0]) {
			translate(v = [0, 0, -50]) {
				cylinder(h = 100, r = 1.8000000000);
			}
		}
	}
}
